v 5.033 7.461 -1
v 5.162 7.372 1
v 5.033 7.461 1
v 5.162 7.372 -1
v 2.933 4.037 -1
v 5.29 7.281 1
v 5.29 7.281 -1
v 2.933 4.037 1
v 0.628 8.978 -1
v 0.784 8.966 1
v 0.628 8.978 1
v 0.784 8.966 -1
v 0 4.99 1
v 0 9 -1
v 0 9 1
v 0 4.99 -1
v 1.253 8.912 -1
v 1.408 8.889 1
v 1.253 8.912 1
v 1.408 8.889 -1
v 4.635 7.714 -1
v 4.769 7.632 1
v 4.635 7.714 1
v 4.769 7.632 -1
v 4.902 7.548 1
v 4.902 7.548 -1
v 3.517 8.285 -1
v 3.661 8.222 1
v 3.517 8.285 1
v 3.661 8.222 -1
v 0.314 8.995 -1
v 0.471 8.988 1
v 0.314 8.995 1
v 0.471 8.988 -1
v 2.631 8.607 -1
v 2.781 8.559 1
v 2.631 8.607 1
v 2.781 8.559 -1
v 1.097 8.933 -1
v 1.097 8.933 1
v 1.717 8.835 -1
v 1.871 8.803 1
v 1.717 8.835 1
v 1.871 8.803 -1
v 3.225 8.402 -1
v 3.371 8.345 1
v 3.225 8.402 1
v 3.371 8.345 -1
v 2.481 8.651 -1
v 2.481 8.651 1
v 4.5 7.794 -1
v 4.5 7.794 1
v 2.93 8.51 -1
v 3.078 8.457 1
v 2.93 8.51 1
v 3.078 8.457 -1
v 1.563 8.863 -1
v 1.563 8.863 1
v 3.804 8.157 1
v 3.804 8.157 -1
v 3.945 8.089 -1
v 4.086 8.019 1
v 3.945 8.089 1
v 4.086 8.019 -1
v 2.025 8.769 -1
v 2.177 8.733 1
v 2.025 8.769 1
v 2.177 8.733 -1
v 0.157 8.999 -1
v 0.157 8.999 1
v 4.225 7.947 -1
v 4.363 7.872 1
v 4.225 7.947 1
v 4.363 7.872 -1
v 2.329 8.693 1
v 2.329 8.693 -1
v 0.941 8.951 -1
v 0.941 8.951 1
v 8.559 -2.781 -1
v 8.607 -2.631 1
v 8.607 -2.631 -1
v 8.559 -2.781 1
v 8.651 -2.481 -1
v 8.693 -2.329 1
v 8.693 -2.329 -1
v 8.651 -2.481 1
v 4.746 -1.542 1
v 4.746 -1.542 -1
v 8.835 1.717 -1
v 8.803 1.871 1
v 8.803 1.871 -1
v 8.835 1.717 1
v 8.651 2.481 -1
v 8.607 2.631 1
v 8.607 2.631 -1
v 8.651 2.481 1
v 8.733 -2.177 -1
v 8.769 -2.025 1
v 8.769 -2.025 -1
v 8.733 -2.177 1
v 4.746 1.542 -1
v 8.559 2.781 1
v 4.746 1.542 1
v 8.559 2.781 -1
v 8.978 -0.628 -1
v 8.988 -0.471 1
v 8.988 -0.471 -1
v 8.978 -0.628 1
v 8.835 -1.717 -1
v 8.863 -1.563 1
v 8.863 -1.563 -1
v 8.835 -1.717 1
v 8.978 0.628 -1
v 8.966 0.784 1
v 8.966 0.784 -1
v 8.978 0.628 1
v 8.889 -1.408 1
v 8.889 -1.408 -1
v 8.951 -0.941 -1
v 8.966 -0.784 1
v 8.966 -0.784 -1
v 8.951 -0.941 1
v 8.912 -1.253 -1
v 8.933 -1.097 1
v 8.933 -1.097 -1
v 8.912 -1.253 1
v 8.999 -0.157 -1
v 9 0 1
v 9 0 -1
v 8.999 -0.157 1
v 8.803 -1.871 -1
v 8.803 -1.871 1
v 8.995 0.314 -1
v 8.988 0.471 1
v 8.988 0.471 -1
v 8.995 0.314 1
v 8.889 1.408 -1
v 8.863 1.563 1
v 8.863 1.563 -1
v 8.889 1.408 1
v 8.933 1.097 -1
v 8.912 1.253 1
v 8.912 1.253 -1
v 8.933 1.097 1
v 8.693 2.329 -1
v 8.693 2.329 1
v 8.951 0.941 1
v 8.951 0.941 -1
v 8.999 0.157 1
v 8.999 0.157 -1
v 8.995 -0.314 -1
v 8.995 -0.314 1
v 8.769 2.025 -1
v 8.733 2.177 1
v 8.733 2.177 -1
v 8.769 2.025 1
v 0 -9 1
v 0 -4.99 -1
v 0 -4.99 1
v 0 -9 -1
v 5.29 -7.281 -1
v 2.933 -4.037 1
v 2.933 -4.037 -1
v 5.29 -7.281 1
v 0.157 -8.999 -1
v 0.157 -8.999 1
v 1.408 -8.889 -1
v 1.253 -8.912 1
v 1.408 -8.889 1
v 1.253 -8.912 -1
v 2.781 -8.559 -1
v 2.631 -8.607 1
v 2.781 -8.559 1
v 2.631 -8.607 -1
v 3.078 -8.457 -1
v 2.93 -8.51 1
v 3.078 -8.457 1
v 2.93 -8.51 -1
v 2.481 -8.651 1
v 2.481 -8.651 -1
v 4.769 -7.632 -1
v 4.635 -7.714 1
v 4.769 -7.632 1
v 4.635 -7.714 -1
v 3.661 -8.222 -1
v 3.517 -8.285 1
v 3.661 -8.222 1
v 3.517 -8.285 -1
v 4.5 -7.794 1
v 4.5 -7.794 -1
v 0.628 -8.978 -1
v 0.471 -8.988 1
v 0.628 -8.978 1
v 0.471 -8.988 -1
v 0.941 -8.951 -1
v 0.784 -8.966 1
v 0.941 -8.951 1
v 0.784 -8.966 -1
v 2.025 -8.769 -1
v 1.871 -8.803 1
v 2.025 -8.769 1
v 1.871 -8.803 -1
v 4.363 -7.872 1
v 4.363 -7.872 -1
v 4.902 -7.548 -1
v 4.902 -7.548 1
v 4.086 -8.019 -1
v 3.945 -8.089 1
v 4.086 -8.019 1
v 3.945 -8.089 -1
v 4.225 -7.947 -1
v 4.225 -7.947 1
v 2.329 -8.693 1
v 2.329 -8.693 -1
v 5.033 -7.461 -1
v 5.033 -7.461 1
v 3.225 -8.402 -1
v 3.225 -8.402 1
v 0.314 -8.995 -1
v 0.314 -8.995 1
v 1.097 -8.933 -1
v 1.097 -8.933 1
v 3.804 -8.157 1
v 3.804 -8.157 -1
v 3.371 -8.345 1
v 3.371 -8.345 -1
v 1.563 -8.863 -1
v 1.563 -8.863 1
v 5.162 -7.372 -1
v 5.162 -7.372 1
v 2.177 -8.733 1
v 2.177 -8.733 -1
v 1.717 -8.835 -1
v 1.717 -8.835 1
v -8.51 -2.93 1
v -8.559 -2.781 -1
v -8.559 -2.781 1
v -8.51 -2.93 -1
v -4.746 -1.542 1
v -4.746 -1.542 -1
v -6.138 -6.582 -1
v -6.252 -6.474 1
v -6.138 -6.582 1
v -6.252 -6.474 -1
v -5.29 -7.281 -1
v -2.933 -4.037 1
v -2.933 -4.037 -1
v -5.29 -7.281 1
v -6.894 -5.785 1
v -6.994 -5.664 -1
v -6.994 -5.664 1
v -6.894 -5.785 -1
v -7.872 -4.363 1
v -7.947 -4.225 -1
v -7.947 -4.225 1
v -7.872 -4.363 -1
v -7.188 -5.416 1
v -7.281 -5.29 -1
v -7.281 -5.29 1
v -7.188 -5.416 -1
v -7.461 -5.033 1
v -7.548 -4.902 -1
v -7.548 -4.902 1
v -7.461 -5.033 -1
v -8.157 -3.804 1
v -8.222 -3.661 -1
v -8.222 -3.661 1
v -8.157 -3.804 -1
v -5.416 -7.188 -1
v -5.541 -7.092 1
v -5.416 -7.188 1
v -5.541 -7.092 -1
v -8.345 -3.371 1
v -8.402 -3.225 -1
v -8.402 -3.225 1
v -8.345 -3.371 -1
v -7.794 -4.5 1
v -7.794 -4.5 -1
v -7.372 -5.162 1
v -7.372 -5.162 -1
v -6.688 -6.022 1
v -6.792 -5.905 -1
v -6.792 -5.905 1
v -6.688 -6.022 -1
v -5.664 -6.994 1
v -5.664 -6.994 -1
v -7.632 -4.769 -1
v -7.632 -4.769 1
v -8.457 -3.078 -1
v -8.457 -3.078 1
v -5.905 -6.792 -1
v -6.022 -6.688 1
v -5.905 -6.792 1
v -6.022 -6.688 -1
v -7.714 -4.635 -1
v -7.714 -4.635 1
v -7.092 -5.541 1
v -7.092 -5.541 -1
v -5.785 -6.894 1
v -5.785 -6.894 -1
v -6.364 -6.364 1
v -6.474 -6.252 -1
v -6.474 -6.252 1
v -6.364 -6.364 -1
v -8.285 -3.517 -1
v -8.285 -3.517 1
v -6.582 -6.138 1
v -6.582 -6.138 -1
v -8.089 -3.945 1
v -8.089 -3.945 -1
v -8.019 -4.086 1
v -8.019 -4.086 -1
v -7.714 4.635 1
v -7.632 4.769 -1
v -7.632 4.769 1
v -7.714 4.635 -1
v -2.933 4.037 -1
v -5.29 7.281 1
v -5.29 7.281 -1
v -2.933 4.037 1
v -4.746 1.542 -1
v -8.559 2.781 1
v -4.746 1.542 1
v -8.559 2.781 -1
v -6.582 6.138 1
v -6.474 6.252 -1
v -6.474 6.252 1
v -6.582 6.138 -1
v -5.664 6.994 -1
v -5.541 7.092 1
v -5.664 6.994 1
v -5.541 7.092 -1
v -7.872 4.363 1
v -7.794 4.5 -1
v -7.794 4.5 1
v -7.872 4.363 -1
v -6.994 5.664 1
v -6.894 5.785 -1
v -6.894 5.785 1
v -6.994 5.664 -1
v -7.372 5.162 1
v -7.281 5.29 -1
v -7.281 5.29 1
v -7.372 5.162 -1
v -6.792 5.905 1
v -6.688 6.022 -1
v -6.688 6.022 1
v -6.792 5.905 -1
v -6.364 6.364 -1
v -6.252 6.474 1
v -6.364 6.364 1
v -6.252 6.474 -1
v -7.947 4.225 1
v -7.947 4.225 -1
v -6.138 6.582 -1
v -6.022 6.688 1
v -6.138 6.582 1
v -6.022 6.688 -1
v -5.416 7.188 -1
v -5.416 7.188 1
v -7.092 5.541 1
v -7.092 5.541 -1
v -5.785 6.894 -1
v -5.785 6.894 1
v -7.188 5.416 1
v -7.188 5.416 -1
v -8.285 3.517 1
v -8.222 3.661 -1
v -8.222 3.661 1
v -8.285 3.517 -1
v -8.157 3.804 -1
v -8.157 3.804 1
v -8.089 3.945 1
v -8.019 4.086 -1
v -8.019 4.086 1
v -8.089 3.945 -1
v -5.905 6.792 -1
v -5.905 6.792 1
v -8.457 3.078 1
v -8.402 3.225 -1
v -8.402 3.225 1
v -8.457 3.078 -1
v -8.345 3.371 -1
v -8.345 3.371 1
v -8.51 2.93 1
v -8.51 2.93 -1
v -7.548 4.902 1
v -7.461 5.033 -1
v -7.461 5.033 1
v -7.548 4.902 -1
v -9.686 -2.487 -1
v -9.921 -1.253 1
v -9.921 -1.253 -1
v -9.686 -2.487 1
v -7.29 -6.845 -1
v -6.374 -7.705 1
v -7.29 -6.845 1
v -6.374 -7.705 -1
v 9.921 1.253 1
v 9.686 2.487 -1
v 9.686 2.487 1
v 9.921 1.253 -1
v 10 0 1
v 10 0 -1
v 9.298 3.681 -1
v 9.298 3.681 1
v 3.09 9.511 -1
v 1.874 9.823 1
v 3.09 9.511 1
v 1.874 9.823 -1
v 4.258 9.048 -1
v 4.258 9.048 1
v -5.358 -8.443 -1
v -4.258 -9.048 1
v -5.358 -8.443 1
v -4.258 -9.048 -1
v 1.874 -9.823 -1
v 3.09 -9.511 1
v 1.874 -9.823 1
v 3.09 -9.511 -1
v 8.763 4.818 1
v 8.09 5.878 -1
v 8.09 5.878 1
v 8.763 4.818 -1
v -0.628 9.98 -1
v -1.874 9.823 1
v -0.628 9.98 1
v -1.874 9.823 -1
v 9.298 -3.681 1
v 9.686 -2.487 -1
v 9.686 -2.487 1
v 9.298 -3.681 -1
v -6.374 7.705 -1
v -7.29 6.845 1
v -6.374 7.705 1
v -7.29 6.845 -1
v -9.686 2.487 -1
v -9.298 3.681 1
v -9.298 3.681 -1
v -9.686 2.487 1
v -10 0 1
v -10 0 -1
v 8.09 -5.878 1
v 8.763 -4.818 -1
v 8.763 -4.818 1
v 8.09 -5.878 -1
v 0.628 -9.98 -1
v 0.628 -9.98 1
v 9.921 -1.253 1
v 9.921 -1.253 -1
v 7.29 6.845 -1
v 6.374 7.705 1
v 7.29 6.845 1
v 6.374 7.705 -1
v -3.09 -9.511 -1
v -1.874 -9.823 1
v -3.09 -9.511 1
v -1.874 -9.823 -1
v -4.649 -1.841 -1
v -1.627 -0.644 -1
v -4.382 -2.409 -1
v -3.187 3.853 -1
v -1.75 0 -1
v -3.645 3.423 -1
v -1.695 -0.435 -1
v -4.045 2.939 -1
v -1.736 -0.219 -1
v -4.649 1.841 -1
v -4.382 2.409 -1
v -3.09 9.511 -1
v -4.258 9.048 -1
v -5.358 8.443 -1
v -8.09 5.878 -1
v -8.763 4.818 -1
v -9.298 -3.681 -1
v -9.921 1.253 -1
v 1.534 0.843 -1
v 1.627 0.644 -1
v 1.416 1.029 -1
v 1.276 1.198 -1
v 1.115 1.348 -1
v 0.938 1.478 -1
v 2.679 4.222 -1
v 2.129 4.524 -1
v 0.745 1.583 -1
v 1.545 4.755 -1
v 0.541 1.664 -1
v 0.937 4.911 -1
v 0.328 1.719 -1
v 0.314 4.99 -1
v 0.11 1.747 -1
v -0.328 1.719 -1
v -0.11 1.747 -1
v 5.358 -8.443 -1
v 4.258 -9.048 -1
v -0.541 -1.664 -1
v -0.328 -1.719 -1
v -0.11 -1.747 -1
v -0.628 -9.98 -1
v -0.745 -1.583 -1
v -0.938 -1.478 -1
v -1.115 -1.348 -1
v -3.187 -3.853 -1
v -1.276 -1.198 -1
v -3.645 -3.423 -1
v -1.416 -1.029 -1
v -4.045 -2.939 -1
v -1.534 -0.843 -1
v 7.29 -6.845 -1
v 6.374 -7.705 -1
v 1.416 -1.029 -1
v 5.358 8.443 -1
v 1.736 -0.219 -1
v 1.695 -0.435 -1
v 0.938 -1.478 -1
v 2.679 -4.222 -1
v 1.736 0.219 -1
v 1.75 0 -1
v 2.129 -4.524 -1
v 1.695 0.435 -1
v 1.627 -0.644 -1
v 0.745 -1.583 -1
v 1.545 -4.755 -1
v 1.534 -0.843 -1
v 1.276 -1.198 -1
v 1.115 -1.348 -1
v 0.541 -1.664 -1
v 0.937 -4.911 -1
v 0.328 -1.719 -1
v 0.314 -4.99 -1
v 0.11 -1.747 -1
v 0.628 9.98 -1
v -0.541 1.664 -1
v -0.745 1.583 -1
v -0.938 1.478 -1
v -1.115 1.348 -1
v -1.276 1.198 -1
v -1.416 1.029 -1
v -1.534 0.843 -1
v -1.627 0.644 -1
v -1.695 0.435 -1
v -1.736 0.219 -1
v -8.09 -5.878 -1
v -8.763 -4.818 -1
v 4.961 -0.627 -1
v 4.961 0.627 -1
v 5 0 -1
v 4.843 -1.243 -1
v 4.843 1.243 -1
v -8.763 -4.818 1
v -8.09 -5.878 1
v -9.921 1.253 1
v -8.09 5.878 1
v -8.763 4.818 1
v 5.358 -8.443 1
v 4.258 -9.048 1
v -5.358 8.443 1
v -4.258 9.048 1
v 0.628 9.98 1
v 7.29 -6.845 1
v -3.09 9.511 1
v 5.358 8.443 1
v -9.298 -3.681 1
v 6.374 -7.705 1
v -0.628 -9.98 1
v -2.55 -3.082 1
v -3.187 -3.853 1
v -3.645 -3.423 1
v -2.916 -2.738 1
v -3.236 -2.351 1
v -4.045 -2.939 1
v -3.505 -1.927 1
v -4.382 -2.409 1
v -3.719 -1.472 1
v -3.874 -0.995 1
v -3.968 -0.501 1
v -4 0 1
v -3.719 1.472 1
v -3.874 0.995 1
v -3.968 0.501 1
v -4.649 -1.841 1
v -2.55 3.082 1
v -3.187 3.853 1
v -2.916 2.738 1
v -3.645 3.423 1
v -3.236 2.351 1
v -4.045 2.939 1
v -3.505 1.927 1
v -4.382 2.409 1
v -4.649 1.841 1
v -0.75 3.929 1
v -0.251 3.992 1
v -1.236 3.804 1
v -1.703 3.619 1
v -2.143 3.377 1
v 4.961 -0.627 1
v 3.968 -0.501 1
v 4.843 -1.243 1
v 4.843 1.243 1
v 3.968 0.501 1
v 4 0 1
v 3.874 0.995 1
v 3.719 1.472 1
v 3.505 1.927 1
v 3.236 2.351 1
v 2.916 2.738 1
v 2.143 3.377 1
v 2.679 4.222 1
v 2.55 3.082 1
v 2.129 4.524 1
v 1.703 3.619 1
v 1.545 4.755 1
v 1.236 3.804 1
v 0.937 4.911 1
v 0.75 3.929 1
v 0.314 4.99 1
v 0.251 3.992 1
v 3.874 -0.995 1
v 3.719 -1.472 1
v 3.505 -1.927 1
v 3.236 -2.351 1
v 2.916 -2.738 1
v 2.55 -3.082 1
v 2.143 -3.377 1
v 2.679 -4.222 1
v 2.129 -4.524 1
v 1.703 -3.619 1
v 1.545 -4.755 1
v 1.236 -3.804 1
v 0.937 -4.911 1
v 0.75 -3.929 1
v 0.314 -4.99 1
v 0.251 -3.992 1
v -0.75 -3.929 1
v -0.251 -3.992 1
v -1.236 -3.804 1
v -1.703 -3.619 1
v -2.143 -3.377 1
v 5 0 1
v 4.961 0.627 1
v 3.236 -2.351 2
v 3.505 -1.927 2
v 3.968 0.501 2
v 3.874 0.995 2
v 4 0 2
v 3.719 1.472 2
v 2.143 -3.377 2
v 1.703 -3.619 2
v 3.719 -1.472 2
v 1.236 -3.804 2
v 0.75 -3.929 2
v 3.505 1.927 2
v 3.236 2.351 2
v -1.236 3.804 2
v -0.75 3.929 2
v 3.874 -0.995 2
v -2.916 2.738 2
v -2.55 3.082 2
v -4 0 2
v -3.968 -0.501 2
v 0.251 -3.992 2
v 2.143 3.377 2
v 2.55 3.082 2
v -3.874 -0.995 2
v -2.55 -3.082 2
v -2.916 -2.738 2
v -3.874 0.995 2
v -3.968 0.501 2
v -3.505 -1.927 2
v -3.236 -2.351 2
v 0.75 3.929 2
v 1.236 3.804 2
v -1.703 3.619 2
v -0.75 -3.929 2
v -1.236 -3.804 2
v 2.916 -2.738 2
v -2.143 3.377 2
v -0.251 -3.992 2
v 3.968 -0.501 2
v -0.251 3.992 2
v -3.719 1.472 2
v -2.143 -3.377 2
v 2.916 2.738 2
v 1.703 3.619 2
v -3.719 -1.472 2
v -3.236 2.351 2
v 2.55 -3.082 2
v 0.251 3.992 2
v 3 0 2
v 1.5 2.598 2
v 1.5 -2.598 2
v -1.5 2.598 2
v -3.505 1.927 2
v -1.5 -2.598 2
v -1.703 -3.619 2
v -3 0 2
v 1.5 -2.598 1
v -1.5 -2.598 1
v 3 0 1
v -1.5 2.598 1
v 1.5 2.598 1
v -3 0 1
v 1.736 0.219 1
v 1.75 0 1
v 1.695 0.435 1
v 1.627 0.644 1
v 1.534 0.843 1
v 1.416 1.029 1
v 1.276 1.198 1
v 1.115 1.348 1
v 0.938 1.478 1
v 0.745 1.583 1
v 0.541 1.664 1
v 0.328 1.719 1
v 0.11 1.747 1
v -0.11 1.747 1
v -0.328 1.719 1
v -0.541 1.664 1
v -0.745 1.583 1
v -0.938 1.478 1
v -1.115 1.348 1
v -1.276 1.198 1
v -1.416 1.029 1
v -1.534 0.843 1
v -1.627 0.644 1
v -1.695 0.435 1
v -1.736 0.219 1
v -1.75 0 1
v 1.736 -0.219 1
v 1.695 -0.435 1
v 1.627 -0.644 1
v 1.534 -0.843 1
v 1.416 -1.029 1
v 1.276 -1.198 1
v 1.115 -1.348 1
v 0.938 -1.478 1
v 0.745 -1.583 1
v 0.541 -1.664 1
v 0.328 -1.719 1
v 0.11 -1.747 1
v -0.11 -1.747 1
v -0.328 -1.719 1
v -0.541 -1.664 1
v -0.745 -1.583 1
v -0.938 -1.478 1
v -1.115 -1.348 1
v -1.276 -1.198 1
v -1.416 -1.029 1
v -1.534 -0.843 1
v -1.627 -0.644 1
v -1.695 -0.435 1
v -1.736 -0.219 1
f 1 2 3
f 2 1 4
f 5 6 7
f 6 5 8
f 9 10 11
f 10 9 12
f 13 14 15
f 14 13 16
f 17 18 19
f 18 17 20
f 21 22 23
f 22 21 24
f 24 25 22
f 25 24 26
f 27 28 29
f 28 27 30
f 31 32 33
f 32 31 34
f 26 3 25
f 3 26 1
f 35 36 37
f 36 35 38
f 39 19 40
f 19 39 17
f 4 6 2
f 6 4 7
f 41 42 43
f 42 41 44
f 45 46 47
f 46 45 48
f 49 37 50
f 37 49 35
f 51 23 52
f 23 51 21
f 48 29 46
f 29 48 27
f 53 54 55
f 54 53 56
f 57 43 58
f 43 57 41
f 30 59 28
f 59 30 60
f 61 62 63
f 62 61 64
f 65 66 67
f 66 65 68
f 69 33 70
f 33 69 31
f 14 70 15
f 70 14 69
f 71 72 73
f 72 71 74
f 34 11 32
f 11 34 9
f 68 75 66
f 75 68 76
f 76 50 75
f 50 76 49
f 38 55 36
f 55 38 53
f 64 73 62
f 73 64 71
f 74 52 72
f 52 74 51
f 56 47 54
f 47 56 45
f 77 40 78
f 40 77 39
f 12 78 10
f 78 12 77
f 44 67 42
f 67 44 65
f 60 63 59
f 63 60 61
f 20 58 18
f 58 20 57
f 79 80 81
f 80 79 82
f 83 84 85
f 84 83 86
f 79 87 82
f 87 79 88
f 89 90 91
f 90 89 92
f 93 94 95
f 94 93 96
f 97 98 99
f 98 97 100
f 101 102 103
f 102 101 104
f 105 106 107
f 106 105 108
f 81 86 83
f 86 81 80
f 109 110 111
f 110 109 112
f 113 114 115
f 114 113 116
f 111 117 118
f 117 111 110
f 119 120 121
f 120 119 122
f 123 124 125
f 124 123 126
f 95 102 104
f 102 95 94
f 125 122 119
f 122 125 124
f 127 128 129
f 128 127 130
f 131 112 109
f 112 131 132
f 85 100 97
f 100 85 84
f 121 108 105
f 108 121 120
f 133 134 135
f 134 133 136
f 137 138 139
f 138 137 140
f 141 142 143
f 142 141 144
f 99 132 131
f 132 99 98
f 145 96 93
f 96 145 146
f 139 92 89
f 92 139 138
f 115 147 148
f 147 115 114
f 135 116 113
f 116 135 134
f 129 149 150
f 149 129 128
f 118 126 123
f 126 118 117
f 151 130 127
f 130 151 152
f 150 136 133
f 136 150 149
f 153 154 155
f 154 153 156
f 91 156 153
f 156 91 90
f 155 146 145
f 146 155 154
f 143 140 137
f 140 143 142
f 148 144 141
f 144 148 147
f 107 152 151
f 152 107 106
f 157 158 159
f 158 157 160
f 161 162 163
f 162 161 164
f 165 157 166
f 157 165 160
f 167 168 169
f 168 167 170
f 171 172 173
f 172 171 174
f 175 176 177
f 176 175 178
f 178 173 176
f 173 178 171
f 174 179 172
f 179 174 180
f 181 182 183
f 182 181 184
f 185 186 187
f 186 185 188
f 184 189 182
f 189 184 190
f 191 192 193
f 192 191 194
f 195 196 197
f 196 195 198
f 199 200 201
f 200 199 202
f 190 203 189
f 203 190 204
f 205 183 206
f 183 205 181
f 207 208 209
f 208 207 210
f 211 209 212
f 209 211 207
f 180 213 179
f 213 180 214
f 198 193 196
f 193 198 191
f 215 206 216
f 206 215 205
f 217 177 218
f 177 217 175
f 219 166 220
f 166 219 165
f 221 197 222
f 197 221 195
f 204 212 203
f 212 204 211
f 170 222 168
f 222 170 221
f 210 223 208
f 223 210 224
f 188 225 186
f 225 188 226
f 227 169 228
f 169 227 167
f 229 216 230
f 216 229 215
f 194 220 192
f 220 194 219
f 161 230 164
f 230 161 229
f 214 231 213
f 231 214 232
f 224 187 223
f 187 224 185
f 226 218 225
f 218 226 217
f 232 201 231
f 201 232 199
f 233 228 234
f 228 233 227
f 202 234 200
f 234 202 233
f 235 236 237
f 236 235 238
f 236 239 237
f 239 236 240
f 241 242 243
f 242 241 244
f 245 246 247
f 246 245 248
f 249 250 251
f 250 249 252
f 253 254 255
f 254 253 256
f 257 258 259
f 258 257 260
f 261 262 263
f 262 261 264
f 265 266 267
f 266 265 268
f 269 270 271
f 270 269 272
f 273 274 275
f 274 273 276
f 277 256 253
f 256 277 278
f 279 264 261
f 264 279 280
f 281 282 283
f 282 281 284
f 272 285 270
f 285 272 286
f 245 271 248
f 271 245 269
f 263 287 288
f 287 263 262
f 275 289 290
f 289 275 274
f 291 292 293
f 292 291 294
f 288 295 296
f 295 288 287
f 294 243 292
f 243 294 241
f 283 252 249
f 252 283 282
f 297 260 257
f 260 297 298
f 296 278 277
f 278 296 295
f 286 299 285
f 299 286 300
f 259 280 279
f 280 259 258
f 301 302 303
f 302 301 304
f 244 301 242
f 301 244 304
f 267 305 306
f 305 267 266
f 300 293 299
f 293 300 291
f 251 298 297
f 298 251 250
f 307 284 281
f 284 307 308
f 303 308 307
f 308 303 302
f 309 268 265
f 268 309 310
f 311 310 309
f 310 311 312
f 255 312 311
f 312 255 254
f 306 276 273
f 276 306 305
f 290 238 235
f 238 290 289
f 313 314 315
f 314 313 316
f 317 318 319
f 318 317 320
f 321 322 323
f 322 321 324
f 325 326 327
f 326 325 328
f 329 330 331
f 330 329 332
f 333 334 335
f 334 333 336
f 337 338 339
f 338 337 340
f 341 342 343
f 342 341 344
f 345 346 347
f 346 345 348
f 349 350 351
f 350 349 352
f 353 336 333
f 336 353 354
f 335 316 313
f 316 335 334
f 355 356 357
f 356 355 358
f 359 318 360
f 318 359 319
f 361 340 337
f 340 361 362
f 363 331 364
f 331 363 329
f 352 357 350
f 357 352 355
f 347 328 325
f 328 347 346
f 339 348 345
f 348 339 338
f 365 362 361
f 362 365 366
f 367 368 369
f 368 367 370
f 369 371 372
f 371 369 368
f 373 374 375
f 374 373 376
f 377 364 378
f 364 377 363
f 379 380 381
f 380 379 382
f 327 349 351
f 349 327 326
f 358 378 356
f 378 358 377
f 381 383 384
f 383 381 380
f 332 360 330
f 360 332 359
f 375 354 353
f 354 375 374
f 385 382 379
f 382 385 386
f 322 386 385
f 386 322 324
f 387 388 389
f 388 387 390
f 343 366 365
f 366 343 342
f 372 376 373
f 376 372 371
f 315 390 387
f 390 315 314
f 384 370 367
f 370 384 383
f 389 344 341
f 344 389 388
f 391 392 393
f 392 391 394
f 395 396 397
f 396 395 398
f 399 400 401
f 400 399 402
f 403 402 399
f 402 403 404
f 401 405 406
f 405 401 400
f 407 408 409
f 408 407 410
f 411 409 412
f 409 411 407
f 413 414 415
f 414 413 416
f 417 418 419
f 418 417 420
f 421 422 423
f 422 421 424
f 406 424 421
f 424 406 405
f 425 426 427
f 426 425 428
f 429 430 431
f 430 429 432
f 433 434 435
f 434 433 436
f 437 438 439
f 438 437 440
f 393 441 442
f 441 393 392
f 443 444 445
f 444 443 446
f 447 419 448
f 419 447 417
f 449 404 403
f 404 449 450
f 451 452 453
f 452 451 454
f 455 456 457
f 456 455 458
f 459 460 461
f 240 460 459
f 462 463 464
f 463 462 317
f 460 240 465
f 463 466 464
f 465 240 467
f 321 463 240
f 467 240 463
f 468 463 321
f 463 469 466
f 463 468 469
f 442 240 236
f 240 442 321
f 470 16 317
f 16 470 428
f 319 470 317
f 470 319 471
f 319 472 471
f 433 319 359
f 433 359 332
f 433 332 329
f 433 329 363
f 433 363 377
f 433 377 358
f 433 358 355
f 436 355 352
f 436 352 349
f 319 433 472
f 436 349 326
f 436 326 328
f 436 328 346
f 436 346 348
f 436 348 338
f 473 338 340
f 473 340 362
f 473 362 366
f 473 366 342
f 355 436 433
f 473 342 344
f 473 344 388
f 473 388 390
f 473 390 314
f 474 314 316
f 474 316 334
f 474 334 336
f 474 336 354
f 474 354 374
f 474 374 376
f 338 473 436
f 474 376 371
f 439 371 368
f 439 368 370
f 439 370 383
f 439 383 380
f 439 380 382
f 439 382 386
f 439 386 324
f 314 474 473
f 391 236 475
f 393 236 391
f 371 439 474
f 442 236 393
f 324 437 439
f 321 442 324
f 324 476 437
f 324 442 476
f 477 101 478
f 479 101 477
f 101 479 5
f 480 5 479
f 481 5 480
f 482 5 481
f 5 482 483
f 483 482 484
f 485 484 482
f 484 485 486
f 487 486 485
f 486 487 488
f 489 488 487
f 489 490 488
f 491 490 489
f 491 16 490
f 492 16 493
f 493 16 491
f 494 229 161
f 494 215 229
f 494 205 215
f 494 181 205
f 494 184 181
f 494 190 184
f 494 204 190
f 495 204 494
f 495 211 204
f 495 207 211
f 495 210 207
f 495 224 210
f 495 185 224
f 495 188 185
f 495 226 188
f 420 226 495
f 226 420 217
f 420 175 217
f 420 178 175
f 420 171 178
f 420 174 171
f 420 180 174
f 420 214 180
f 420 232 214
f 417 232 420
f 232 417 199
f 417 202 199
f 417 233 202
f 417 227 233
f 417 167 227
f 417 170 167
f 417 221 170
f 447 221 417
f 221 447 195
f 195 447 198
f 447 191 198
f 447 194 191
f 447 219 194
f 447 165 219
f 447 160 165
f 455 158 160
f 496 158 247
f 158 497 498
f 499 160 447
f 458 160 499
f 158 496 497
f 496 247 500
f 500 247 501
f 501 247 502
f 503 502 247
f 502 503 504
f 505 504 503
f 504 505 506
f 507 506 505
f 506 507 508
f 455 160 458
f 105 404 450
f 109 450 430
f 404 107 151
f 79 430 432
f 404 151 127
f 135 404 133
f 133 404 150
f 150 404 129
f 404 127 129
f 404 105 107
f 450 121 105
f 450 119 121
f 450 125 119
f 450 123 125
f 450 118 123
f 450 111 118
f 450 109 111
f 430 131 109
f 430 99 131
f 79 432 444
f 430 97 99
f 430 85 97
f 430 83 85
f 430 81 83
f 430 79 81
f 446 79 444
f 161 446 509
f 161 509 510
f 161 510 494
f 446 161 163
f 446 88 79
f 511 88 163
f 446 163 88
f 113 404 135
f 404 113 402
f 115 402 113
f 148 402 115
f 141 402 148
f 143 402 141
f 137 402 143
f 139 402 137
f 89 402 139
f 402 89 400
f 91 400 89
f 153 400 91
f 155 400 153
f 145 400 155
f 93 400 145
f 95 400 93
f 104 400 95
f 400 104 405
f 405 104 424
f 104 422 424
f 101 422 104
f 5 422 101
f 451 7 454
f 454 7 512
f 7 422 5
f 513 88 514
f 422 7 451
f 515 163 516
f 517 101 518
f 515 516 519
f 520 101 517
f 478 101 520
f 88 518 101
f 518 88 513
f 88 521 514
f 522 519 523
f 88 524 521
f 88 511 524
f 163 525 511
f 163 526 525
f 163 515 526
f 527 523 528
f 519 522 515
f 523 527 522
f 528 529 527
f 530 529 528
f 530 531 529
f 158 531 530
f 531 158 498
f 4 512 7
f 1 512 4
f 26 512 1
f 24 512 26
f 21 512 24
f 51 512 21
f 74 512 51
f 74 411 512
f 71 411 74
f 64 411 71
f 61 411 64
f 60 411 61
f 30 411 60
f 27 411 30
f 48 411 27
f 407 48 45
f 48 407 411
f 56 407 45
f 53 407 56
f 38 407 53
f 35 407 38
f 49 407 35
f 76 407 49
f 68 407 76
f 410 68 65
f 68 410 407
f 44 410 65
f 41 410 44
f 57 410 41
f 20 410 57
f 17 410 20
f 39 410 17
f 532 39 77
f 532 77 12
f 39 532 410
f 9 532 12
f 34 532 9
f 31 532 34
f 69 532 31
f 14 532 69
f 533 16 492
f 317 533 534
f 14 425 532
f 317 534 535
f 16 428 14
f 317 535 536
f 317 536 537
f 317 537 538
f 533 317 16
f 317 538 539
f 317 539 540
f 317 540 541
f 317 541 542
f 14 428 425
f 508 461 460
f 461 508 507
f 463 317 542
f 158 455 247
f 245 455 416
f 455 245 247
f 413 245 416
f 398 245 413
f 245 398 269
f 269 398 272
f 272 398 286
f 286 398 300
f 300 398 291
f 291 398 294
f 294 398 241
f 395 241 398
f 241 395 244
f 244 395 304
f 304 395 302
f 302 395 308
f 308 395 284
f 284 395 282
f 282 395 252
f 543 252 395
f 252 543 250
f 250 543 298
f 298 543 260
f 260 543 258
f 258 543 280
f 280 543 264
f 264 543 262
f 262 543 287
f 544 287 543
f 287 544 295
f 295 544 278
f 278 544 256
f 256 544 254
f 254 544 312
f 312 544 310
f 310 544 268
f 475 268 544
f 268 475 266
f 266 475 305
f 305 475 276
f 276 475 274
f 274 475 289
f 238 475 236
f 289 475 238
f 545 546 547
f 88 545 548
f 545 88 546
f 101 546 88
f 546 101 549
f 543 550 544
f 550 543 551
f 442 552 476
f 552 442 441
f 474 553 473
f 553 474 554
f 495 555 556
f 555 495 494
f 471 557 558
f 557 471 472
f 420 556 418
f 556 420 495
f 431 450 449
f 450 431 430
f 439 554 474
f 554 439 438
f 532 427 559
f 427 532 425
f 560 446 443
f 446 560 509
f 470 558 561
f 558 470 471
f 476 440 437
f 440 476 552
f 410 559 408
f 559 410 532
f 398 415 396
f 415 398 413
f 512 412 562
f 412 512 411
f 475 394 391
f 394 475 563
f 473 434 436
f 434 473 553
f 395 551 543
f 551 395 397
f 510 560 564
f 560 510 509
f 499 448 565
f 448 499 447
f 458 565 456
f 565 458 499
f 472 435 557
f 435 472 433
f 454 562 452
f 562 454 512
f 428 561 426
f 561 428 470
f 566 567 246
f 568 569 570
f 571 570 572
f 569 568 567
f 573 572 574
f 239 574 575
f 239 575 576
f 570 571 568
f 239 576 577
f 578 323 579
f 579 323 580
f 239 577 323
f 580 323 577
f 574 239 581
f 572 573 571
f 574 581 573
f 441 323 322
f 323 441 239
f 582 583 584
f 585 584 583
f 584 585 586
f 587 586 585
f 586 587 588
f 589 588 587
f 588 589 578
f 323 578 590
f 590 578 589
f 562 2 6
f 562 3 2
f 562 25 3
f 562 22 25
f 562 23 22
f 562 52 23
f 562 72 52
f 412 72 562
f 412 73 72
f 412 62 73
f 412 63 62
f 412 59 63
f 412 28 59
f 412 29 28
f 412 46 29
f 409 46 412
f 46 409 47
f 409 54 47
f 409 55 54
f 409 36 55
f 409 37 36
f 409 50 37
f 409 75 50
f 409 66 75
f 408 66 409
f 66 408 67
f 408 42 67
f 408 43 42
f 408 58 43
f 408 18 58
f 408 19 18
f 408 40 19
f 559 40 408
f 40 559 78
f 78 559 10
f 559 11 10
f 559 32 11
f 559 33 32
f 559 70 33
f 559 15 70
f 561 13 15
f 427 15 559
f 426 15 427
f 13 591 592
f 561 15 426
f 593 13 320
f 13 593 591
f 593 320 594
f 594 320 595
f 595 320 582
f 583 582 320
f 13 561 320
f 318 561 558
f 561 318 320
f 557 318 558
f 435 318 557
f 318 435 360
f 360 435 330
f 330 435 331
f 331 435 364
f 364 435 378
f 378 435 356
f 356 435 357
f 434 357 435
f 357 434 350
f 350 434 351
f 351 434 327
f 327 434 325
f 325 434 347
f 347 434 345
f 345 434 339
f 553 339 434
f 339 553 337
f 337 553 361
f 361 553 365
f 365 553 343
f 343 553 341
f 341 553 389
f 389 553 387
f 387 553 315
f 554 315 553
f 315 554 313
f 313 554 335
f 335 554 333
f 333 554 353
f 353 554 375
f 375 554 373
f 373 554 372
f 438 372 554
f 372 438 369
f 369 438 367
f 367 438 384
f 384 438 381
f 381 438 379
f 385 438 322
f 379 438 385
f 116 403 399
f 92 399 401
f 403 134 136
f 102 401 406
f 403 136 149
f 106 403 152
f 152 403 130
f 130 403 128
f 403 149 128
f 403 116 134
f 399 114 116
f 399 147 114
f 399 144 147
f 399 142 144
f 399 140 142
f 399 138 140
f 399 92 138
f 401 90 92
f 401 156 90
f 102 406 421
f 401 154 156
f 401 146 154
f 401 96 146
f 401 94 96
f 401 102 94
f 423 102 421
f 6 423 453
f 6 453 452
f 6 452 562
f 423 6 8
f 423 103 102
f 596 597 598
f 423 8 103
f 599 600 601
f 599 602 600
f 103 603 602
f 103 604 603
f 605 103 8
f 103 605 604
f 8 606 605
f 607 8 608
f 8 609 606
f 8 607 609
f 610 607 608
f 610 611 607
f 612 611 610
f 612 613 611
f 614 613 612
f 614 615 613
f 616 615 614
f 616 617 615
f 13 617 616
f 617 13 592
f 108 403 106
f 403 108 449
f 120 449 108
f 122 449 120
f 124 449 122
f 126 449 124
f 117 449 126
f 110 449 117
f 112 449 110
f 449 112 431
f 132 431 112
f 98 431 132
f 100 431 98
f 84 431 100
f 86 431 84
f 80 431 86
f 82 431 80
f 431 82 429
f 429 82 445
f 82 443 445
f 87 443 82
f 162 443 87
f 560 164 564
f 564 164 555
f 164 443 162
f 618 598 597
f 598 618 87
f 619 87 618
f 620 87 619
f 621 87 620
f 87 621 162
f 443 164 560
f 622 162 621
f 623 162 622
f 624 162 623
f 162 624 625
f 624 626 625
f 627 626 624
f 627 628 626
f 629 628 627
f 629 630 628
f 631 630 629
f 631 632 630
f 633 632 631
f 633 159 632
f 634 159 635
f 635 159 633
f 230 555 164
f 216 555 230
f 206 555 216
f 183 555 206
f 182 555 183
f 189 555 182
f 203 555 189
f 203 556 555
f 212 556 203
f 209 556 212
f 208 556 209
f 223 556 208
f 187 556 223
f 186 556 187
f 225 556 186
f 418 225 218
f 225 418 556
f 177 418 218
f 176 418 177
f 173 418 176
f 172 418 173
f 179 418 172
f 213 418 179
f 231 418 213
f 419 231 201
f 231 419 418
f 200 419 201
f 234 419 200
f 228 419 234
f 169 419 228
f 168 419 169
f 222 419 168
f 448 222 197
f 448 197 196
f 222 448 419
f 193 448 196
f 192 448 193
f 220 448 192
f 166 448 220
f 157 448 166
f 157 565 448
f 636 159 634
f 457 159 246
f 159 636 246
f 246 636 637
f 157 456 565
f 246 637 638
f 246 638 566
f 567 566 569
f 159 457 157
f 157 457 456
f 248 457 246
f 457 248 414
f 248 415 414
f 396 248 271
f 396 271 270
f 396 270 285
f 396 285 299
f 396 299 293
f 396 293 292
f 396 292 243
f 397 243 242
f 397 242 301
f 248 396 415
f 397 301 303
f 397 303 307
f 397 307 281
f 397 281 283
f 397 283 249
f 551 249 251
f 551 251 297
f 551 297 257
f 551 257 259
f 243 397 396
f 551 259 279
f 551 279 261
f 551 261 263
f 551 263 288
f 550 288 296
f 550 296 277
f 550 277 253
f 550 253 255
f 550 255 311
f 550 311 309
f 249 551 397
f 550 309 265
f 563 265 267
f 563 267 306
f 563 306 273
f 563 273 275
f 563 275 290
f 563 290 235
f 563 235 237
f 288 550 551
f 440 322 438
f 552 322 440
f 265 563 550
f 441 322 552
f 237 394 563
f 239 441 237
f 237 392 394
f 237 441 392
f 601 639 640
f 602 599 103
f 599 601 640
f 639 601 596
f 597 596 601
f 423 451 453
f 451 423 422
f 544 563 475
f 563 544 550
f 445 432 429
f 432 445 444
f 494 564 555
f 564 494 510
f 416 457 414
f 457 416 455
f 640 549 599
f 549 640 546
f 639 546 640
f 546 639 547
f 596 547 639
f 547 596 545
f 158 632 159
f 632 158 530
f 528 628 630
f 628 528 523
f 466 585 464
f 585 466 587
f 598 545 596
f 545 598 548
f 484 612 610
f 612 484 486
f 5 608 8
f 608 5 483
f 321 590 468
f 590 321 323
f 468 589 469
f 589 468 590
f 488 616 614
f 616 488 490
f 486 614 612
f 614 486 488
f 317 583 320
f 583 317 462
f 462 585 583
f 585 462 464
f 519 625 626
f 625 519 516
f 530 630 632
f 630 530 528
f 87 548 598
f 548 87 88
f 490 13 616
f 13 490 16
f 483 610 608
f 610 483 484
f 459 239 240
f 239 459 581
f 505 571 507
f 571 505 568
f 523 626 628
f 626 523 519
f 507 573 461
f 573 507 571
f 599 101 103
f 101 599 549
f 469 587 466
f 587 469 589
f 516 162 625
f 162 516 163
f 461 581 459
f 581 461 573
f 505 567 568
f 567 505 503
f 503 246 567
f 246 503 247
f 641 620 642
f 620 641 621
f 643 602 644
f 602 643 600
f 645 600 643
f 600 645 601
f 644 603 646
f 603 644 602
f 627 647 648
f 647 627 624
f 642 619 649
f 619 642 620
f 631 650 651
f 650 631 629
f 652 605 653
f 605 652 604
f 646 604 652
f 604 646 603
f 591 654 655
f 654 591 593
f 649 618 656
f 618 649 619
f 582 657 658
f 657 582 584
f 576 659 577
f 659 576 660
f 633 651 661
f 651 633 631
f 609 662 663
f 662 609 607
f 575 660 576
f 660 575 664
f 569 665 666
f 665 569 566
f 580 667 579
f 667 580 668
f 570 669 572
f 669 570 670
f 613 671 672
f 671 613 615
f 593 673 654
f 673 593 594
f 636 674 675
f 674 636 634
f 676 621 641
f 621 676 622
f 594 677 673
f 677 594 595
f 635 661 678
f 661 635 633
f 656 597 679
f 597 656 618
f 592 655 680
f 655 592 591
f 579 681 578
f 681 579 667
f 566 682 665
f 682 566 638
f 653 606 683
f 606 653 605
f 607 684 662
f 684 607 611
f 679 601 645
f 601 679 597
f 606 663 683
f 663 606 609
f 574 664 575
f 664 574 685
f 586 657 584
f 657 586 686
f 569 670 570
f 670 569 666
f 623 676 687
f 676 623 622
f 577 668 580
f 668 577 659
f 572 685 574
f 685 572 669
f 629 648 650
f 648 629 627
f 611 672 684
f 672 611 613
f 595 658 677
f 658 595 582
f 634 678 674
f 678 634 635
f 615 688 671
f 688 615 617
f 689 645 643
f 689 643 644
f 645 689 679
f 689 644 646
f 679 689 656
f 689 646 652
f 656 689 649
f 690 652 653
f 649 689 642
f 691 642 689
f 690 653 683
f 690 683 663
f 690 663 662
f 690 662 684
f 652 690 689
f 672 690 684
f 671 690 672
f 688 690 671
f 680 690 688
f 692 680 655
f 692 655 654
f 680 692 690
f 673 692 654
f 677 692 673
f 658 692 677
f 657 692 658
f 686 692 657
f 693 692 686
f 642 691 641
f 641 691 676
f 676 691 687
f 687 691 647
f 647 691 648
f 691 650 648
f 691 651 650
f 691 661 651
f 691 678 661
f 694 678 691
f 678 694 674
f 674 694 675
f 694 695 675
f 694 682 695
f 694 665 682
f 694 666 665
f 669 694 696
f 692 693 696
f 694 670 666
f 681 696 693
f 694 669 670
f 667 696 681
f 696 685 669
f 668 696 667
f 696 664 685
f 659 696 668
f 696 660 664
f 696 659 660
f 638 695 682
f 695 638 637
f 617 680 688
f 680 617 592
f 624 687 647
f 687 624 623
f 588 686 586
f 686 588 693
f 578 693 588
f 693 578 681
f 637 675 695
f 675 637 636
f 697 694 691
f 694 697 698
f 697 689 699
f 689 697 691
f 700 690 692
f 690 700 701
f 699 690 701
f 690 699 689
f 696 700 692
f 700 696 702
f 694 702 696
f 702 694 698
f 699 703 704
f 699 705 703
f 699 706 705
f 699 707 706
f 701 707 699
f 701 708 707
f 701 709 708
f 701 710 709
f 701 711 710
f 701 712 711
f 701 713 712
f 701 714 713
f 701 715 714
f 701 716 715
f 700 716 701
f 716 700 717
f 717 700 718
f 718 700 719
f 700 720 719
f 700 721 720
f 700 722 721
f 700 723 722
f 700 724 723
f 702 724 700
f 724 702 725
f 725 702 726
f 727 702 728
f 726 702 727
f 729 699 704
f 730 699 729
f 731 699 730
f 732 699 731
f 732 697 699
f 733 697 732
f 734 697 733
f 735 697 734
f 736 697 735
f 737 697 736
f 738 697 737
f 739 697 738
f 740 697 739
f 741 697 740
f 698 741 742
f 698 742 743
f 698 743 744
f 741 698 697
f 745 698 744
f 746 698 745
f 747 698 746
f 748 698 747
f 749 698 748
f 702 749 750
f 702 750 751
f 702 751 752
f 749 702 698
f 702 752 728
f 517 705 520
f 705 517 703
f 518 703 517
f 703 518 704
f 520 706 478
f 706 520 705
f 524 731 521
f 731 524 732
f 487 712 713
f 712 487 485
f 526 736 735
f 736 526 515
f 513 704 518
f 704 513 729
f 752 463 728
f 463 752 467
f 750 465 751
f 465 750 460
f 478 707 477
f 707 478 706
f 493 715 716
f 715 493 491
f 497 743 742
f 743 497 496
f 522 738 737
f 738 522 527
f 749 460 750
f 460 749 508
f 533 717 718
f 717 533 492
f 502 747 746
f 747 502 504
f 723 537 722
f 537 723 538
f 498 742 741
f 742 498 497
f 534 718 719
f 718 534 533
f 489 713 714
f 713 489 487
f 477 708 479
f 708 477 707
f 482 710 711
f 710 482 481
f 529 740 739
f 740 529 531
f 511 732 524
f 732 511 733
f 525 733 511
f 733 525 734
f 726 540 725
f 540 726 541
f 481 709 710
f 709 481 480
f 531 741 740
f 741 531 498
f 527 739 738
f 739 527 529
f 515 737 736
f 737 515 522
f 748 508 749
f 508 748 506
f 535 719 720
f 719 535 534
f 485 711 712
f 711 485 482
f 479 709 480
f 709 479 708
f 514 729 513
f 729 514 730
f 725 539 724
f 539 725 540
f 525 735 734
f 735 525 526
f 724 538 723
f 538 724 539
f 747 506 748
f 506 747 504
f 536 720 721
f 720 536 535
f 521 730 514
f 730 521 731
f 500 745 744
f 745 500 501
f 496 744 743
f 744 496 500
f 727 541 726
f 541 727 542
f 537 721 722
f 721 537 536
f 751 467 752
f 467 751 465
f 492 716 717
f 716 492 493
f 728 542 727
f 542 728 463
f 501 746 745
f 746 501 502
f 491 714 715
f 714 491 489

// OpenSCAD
/* 
 * Parametric Encoder Wheel 
 *
 * by Rafael Estevam, November 2015
 * http://www.RafaelEstevam.Net
 * 
 * Licenced under Creative Commons Public Domain
*/

ExternalRadius = 10;
WallTickness = 1;
InnerRadius = 5;
TeethCount = 5;
WheelHeight = 2;
CenterHoleRadius = 1.75;
CenterHoleExagonal = "No"; // [No,Yes]
CenterSupportRadius = 4;
CenterSupportHeight = 2;
CenterSupportHoleRadius = 3;
CenterSupportHoleExagonal = "Yes"; // [No,Yes]

/* [HIDDEN] */
$fn=50;

difference(){
    union(){
        Wheel(ExternalRadius,WallTickness,
              InnerRadius,TeethCount,WheelHeight);
        cylinder(h=CenterSupportHeight,
                 r=CenterSupportRadius);
    }
    translate([0,0,WheelHeight/2])
        cylinder(h=(WheelHeight+CenterSupportHeight)*2,
                 r=CenterSupportHoleRadius,
                 $fn=CenterSupportHoleExagonal == "No" ? 50:6);
    translate([0,0,-WheelHeight+0.01])
        cylinder(h=WheelHeight*2,
                 r=CenterHoleRadius,
                 $fn=CenterHoleExagonal == "No" ? 50:6);
}


module Wheel(ExtRadius,Wall,InnerRadius,TeehCount,Height){
    cylinder(r=InnerRadius,h=Height,center=true);
    difference(){
        cylinder(r=ExtRadius,h=Height,center=true);
        for(a = [0:2:TeehCount*2]){
            stepAngle = 360.0 / (TeehCount*2);
            3DArc(Height+1,a*stepAngle,
                  (a+1)*stepAngle,
                  ExtRadius-Wall);
            
        }
    }
}
module 3DArc(Height,StartAngle,EndAngle,Radius){
    linear_extrude(height=Height,center=true)
    2DArc(StartAngle,EndAngle,Radius);
}
module 2DArc(StartAngle,EndAngle,Radius){
    points = [ 
        for (a = [StartAngle : EndAngle]) 
            Radius * [ sin(a), cos(a) ] ];
    polygon(concat(points, [[0, 0]]));
}
